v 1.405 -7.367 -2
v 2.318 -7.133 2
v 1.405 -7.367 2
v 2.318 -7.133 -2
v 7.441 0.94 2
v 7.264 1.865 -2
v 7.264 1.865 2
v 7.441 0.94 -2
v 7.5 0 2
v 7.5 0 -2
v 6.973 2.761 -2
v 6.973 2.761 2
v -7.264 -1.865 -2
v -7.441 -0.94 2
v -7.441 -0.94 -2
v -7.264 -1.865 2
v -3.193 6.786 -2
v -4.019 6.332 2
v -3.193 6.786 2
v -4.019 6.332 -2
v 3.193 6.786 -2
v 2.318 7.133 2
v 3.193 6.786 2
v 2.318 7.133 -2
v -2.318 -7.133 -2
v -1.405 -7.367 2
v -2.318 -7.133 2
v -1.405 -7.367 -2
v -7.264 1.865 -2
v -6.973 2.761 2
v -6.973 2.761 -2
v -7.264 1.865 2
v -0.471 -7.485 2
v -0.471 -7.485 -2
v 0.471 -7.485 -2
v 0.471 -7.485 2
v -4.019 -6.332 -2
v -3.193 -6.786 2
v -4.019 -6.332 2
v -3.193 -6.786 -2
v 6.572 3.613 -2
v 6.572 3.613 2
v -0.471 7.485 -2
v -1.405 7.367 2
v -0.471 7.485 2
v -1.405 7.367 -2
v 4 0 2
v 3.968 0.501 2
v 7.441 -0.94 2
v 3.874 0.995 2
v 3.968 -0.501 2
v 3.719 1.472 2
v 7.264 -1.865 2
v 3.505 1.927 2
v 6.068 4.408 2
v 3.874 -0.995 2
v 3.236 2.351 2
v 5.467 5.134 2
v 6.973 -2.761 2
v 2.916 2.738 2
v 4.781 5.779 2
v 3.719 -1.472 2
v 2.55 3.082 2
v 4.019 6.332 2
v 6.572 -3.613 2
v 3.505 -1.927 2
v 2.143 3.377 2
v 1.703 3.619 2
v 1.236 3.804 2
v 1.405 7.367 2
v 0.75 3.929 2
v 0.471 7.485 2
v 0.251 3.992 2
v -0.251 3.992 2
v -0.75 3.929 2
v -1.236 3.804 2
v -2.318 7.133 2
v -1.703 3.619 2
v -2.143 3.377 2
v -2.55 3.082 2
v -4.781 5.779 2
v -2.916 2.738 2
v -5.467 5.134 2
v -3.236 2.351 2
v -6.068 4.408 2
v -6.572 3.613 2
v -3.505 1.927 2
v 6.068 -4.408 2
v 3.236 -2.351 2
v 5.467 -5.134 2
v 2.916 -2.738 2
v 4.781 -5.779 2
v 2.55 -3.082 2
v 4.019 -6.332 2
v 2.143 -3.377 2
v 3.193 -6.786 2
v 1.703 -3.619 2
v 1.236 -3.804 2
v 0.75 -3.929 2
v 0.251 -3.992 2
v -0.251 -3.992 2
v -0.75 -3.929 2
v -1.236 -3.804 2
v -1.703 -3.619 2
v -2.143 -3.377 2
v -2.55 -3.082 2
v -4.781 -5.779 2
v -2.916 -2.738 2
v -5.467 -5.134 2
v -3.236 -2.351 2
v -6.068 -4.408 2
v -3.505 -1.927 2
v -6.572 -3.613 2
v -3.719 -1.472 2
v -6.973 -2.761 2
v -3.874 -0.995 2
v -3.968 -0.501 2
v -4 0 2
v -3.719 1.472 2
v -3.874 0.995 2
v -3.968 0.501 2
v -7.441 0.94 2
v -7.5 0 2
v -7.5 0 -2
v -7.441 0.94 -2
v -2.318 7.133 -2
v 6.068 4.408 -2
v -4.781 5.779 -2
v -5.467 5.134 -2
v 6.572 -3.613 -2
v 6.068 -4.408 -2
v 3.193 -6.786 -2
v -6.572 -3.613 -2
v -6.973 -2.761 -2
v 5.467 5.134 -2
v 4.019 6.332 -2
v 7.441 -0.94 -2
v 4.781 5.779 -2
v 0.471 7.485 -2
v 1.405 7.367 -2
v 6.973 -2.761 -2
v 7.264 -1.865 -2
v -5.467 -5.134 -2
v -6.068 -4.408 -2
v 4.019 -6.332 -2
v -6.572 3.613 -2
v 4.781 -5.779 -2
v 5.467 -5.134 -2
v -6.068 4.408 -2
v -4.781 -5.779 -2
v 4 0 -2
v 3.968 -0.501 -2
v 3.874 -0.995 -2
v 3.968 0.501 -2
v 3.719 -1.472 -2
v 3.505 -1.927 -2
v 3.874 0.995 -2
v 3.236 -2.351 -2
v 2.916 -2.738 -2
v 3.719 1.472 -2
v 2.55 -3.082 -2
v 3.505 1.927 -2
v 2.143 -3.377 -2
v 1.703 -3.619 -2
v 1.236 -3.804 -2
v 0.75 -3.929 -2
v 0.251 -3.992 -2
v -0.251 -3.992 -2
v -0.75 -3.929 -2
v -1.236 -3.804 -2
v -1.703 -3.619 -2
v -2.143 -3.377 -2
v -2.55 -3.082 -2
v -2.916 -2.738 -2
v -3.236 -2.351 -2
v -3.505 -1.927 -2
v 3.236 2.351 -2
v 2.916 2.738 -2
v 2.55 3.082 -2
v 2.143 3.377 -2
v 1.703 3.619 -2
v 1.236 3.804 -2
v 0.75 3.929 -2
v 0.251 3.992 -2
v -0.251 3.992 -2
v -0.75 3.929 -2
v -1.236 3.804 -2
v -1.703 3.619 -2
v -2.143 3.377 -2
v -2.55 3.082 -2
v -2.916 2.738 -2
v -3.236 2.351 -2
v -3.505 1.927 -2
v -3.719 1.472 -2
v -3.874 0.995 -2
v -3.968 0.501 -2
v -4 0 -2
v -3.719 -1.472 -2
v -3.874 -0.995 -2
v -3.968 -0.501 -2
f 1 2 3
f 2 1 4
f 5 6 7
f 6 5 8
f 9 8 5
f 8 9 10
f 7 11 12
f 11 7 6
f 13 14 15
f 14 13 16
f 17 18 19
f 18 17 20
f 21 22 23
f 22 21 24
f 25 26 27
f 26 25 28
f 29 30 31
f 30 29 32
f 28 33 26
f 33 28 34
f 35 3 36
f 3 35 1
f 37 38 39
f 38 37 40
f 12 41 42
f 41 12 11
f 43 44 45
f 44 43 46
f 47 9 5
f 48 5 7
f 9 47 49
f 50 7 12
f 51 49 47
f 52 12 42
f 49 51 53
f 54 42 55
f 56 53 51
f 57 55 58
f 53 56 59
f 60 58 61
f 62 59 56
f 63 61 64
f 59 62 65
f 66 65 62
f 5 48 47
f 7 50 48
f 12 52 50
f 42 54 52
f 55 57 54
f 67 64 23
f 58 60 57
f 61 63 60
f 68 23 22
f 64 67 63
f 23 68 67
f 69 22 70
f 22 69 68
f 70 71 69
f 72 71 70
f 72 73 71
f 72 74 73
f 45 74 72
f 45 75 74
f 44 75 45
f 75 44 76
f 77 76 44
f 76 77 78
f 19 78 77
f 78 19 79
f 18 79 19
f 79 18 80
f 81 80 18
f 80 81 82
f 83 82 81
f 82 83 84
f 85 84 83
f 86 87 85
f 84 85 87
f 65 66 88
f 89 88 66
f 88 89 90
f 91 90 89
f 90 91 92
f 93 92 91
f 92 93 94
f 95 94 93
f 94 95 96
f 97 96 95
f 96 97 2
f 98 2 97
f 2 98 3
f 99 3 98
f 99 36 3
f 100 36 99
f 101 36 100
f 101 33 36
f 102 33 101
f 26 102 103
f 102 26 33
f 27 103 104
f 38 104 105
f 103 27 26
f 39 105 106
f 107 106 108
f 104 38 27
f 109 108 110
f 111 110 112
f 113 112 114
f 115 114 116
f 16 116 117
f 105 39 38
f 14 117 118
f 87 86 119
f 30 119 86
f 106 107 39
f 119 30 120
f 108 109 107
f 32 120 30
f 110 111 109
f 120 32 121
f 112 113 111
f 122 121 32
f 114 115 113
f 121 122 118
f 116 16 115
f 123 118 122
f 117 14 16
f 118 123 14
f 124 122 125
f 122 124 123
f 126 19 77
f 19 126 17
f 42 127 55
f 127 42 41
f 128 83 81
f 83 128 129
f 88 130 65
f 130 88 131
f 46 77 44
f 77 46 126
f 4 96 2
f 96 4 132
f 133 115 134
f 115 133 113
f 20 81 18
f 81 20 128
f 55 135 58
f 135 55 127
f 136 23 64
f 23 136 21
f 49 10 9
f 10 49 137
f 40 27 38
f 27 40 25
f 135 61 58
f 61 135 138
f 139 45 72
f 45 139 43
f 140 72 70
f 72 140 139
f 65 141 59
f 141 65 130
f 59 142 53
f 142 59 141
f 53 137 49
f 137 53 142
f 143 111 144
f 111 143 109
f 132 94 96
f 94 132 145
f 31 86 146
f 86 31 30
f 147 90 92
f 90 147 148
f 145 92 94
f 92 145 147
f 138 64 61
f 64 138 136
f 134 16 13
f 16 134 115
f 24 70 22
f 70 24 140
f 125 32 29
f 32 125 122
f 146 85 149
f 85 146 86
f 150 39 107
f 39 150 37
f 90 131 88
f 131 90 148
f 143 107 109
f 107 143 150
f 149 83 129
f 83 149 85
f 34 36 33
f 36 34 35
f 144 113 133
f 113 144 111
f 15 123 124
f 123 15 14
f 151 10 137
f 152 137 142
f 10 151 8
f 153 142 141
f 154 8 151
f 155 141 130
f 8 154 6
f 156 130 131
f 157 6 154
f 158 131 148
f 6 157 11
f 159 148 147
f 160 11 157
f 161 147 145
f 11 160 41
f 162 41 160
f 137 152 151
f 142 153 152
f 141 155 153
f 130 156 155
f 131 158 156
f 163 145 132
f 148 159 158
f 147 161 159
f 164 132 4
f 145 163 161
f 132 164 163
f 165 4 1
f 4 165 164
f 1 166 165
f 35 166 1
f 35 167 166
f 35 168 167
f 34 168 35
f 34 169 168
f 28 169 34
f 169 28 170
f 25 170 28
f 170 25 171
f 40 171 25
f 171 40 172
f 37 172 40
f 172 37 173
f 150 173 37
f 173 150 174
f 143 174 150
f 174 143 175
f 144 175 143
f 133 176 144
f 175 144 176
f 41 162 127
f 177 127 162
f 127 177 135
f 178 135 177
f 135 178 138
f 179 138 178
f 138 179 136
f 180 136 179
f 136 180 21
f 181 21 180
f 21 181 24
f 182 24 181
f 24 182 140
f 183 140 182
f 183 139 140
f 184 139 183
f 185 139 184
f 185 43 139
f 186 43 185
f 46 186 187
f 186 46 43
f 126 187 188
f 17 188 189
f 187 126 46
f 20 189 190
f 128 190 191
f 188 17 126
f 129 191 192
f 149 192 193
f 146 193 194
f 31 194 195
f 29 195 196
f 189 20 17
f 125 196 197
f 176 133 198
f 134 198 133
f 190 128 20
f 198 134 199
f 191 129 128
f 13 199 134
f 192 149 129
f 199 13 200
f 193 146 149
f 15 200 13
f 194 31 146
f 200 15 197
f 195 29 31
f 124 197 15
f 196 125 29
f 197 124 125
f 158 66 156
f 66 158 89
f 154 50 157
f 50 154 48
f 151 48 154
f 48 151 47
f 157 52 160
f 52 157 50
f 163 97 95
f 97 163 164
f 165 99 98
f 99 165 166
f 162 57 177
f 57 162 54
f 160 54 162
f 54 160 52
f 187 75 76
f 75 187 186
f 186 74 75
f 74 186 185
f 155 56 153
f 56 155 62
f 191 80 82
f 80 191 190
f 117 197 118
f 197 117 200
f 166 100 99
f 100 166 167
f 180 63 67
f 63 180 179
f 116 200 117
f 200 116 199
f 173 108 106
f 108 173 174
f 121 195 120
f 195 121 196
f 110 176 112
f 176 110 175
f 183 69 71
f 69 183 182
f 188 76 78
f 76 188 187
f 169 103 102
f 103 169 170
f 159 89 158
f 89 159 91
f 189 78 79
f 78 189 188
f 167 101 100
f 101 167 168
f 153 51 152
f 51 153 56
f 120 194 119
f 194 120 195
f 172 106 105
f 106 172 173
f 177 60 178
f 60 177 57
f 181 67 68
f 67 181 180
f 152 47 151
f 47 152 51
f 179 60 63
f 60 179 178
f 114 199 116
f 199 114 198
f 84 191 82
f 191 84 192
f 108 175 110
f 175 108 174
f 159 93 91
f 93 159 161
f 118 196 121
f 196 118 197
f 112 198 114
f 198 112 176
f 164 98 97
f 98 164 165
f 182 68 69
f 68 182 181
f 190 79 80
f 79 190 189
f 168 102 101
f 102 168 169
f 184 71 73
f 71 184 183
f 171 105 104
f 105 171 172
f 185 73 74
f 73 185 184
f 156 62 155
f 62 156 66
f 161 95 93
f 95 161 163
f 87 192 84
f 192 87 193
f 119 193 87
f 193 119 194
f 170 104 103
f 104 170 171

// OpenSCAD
$fn = 50;


difference() {
	union() {
		translate(v = [0, 0, -2.0000000000]) {
			cylinder(h = 4, r = 7.5000000000);
		}
	}
	union() {
		translate(v = [0, 0, -100.0000000000]) {
			cylinder(h = 200, r = 4.0000000000);
		}
	}
}
